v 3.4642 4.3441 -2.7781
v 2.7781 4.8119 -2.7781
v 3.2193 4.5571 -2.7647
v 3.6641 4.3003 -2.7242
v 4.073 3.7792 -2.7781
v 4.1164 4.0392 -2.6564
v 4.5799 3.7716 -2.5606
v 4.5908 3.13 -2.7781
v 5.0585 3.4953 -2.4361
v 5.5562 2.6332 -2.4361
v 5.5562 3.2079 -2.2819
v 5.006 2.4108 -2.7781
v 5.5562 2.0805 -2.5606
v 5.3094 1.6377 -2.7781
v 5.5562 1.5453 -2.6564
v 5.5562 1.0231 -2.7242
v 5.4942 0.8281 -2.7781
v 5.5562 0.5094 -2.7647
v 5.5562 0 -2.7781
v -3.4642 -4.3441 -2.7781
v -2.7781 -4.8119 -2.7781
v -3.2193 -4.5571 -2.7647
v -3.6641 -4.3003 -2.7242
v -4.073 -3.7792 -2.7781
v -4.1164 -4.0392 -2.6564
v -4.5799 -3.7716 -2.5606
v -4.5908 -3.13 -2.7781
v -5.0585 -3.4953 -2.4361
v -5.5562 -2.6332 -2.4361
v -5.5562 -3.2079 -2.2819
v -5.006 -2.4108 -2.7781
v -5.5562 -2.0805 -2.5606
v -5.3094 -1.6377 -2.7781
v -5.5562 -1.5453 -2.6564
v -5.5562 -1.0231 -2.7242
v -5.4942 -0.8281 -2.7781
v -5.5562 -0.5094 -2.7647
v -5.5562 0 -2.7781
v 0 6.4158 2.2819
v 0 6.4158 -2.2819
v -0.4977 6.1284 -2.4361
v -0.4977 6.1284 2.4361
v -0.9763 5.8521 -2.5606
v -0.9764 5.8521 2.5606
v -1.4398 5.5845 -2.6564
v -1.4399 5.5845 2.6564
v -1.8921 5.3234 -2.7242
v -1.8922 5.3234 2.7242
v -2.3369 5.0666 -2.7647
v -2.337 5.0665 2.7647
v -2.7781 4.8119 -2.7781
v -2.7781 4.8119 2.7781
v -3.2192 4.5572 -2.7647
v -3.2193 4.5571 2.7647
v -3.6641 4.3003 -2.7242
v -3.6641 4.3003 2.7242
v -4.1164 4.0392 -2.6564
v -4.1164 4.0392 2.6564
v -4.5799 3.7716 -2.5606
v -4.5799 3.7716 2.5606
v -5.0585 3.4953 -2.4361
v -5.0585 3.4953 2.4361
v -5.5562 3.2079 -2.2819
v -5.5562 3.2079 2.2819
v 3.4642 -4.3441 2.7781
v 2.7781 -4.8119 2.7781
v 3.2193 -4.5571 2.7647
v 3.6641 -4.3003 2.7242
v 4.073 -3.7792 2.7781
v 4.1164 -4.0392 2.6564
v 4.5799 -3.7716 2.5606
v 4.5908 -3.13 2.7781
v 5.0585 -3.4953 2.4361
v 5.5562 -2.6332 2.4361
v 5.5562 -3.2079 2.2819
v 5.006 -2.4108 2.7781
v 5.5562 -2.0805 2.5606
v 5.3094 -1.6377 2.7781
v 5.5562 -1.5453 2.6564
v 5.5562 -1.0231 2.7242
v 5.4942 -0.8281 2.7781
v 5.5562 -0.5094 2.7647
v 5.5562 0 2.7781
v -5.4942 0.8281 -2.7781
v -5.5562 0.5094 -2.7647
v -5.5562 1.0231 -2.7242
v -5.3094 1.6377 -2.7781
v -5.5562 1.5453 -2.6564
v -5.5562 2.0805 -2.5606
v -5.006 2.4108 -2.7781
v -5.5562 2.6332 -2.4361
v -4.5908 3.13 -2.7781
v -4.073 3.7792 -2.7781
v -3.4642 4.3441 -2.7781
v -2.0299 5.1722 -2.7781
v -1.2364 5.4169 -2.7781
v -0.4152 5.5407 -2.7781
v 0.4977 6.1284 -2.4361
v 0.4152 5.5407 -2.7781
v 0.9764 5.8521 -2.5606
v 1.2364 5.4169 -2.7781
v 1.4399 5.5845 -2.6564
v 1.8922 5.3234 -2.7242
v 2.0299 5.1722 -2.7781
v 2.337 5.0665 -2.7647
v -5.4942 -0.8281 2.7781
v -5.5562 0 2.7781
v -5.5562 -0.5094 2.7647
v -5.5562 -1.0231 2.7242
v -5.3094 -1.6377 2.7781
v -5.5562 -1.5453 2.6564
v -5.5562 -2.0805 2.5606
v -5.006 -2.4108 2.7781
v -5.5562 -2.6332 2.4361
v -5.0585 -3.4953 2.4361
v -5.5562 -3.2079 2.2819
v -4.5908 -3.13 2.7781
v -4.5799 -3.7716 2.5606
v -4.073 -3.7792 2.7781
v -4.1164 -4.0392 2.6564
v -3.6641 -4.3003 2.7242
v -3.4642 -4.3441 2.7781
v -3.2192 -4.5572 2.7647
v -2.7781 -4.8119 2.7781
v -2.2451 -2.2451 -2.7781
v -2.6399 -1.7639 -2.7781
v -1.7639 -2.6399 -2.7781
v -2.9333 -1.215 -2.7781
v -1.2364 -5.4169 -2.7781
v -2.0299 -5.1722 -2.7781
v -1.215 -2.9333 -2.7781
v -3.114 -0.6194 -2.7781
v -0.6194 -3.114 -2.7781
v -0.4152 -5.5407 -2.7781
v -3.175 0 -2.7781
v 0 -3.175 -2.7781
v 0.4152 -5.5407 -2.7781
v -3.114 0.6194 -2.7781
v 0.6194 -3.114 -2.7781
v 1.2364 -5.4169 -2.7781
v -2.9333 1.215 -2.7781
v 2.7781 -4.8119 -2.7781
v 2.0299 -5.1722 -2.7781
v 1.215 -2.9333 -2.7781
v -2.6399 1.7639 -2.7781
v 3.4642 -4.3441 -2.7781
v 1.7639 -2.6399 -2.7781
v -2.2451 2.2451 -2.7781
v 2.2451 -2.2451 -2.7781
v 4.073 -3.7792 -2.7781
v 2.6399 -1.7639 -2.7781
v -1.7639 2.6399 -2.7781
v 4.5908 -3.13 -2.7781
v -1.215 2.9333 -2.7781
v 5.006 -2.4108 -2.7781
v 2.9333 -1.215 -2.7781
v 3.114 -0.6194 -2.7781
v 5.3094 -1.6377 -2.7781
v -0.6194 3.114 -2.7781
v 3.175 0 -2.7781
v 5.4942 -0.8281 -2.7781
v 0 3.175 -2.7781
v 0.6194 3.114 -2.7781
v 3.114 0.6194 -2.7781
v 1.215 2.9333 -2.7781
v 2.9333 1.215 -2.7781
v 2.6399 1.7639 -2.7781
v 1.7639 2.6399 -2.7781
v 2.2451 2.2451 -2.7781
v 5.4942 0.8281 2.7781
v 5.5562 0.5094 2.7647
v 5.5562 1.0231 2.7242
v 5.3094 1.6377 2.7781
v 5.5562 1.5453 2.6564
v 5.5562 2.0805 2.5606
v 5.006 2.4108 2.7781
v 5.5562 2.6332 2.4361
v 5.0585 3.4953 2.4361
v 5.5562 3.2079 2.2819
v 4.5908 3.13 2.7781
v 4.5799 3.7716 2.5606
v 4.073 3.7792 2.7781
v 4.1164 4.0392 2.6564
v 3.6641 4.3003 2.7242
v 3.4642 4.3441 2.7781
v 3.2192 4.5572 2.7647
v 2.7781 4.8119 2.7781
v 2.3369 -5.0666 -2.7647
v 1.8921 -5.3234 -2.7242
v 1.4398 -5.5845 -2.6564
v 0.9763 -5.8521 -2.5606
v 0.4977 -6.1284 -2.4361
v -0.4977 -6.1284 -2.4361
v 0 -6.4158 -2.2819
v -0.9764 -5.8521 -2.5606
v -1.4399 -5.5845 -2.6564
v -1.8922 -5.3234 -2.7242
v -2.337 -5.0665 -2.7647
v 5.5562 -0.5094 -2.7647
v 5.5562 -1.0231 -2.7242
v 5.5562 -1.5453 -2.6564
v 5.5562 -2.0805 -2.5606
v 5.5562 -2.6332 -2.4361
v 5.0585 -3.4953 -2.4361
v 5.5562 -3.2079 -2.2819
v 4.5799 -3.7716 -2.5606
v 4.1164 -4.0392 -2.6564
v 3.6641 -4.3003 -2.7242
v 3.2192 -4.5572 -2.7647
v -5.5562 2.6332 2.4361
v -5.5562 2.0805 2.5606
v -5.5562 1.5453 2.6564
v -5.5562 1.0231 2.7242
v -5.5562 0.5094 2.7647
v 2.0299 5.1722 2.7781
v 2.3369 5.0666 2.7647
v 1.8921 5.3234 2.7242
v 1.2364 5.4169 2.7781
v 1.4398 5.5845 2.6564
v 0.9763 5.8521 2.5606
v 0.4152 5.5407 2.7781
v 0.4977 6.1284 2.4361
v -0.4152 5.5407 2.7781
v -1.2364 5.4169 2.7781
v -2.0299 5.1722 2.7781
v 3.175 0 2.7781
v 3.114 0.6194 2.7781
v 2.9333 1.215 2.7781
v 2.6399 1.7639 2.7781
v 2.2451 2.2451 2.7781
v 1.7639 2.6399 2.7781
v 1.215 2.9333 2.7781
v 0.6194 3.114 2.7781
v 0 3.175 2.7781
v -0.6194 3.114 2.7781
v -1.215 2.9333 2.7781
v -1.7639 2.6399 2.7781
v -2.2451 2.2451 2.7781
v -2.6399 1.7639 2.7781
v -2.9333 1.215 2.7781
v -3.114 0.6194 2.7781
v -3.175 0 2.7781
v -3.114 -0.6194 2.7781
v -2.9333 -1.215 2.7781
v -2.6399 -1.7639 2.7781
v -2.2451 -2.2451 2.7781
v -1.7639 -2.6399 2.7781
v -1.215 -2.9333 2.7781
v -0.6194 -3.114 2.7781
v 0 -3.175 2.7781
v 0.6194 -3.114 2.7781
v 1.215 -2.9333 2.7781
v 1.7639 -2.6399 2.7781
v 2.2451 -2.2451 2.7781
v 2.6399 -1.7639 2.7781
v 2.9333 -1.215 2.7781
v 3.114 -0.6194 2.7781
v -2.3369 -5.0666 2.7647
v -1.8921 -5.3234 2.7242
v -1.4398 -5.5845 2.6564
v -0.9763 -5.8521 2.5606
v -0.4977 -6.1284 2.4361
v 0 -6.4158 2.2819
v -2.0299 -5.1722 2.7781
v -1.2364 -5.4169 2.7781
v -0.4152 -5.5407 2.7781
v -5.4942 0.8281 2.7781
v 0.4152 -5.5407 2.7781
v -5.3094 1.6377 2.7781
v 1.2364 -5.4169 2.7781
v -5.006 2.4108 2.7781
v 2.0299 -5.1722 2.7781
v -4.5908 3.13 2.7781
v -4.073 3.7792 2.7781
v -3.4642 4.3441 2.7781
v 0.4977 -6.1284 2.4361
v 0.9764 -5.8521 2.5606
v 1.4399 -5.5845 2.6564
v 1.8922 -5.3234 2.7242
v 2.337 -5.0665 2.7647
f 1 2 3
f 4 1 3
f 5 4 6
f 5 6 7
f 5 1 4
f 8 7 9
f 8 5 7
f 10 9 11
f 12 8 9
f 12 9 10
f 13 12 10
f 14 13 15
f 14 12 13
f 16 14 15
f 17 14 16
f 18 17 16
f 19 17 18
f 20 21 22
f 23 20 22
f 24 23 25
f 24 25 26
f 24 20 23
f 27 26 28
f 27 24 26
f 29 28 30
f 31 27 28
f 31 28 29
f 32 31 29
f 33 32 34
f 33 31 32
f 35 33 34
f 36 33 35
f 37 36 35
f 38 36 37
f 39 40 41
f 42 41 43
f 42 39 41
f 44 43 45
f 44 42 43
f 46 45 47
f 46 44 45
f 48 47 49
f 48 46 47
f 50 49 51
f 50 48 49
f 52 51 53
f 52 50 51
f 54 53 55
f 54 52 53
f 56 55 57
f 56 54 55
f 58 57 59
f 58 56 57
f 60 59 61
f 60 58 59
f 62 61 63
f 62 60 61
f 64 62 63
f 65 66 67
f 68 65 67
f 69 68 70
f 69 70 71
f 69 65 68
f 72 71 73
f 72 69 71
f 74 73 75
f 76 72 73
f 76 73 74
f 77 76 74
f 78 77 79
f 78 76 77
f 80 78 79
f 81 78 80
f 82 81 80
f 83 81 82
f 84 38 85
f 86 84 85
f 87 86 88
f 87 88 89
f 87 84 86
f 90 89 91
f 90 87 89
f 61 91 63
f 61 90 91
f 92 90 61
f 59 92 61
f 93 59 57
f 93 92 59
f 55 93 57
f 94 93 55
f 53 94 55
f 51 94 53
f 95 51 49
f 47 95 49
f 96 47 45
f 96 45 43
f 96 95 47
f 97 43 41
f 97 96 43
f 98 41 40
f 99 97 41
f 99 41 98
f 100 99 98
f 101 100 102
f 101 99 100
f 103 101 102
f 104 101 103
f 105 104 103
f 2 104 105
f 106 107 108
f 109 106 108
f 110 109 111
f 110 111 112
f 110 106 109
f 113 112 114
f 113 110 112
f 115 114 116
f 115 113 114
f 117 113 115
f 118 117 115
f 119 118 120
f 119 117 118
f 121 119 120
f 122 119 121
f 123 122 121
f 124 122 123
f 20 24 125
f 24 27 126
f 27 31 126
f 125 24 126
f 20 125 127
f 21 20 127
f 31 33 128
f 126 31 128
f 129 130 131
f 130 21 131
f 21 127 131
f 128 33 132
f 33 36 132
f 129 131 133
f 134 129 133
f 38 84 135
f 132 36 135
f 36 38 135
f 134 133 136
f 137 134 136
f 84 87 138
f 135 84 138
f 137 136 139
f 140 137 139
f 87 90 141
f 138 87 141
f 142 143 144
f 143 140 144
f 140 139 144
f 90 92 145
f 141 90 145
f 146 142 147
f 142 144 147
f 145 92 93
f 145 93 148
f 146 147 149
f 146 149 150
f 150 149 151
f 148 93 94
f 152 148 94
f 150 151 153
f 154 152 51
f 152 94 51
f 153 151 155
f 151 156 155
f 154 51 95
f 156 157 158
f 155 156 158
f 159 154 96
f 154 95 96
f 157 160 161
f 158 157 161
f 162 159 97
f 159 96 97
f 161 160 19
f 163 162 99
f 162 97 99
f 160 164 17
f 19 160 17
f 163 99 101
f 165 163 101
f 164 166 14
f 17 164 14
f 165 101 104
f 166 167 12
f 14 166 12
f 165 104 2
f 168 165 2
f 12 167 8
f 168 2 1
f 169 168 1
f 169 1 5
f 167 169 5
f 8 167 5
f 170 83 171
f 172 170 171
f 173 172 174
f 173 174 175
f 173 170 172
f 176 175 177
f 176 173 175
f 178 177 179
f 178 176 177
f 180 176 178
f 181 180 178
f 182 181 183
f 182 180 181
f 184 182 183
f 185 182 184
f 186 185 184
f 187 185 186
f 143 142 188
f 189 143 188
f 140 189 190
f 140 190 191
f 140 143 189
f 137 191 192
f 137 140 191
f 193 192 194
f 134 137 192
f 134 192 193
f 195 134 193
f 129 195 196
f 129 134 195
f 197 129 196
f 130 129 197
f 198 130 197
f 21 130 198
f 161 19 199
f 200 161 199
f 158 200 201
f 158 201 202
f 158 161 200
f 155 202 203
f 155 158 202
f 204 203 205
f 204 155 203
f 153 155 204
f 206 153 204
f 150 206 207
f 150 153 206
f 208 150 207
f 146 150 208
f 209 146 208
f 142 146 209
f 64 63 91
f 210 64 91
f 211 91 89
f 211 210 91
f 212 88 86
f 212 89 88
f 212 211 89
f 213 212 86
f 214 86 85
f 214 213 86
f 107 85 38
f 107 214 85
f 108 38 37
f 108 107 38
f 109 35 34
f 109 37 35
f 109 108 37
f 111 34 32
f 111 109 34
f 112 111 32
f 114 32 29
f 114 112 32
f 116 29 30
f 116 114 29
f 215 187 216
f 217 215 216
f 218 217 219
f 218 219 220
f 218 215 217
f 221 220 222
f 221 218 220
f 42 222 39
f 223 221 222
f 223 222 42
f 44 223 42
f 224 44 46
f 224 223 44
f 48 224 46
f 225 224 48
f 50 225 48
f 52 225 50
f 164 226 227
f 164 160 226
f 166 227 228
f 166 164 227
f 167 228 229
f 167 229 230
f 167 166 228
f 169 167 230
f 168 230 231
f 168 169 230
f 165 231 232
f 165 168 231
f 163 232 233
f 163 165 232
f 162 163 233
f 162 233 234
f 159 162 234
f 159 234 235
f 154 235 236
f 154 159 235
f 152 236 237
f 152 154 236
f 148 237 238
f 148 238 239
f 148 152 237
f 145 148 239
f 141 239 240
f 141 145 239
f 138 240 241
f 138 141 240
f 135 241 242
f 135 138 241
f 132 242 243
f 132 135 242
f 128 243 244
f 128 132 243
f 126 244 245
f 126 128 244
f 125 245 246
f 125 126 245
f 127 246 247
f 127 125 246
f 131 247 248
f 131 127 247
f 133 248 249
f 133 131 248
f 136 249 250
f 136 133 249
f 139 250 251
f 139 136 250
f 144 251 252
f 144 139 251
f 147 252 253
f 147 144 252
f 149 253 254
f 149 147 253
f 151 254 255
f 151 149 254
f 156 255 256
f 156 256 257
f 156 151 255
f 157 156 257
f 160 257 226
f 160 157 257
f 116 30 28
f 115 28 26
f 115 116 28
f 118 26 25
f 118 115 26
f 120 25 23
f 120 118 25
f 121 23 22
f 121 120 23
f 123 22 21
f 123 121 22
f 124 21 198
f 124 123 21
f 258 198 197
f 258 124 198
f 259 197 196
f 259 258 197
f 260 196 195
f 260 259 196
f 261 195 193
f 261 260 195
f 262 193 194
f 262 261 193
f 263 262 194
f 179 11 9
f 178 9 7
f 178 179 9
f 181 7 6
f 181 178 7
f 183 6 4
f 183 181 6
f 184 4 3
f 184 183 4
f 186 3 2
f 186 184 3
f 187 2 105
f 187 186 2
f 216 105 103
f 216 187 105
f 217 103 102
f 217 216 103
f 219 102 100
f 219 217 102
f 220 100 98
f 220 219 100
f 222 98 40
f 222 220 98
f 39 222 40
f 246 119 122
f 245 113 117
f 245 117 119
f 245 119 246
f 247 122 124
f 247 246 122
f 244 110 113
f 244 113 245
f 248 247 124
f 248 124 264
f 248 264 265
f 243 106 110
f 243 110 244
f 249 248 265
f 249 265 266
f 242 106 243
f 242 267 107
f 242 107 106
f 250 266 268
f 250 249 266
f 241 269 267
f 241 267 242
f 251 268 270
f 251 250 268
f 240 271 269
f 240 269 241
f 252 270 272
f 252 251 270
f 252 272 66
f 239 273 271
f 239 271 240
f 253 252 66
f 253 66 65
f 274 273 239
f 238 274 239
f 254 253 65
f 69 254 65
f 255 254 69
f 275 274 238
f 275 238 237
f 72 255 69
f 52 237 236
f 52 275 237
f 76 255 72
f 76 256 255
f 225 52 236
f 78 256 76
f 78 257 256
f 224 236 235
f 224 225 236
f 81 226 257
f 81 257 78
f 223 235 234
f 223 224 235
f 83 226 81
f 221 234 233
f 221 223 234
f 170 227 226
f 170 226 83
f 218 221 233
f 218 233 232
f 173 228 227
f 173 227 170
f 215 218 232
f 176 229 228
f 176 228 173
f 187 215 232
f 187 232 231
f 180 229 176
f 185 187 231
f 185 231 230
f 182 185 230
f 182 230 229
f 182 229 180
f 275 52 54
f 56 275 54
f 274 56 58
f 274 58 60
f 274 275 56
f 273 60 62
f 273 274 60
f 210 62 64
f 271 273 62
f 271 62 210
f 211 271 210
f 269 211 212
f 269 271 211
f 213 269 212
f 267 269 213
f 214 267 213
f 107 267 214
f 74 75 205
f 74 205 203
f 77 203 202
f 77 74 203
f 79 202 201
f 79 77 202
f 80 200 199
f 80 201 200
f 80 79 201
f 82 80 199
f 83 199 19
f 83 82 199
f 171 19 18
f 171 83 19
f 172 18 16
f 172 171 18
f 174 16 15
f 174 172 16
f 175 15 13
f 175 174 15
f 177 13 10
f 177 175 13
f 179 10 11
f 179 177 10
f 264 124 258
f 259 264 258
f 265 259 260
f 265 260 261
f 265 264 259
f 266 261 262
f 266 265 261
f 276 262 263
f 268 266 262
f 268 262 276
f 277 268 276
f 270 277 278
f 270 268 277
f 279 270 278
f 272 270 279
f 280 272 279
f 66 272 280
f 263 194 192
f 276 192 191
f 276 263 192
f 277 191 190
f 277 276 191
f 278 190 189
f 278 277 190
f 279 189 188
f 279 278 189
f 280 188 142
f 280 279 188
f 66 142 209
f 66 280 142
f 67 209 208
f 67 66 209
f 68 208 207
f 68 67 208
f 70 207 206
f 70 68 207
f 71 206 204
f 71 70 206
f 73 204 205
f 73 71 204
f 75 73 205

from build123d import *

# Parameters (mm, degrees)
SKETCH1_R               = 3.175
EXTRUDE1_DEPTH          = 2.778125
SKETCH7_OUTSIDE_W       = 104.672
SKETCH7_OUTSIDE_H       = 106.392
SKETCH7_OUTSIDE_R       = 5.55625
EXTRUDE2_DEPTH          = 25.4
EXTRUDE2_DRAFT          = -60
MIRROR1_COPY_1_SKETCH_W = 104.672
MIRROR1_COPY_1_SKETCH_H = 106.392
MIRROR1_COPY_1_SKETCH_R = 5.55625
MIRROR1_COPY_1_DEPTH    = 25.4
MIRROR1_COPY_1_DRAFT    = -60


with BuildPart() as part:
    # Sketch1 → Extrude1 (new, symmetric)
    with BuildSketch(Plane.XY):
        Polygon((-5.55625, 3.207902433), (-5.55625, -3.207902433), (0, -6.415804866), (5.55625, -3.207902433), (5.55625, 3.207902433), (0, 6.415804866), align=None)
        Circle(SKETCH1_R, mode=Mode.SUBTRACT)
    extrude(amount=EXTRUDE1_DEPTH, both=True)


with BuildPart() as extrude2_tool:
    # Sketch7 outside → Extrude2 (with draft: the straight prism first)
    with BuildSketch(Plane.XY.offset(2.778125)):
        Rectangle(SKETCH7_OUTSIDE_W, SKETCH7_OUTSIDE_H)
        Circle(SKETCH7_OUTSIDE_R, mode=Mode.SUBTRACT)
    extrude(amount=-EXTRUDE2_DEPTH)
    # Extrude2: the draft: its side faces are tilted about the plane it starts from
    extrude2_sides = [extrude2_tool.faces().sort_by_distance(p)[0] for p in [
        (0, -53.196, -9.921875),
        (52.336, 0, -9.921875),
        (0, 53.196, -9.921875),
        (-52.336, 0, -9.921875),
        (-5.55625, 0, -9.921875),
    ]]
    draft(extrude2_sides, Plane.XY.offset(2.778125), EXTRUDE2_DRAFT)


with BuildPart() as part_1:
    add(part.part)

    # Extrude2: cut by extrude2_tool
    add(extrude2_tool.part, mode=Mode.SUBTRACT)


with BuildPart() as mirror1_copy_1_tool:
    # Mirror1 copy 1 sketch → Mirror1 copy 1 (with draft: the straight prism first)
    with BuildSketch(Plane(origin=(0, 0, -2.778125), x_dir=(1, 0, 0), z_dir=(0, 0, -1))):
        Rectangle(MIRROR1_COPY_1_SKETCH_W, MIRROR1_COPY_1_SKETCH_H)
        Circle(MIRROR1_COPY_1_SKETCH_R, mode=Mode.SUBTRACT)
    extrude(amount=-MIRROR1_COPY_1_DEPTH)
    # Mirror1 copy 1: the draft: its side faces are tilted about the plane it starts from
    mirror1_copy_1_sides = [mirror1_copy_1_tool.faces().sort_by_distance(p)[0] for p in [
        (0, -53.196, 9.921875),
        (52.336, 0, 9.921875),
        (0, 53.196, 9.921875),
        (-52.336, 0, 9.921875),
        (-5.55625, 0, 9.921875),
    ]]
    draft(mirror1_copy_1_sides, Plane(origin=(0, 0, -2.778125), x_dir=(1, 0, 0), z_dir=(0, 0, -1)), MIRROR1_COPY_1_DRAFT)


with BuildPart() as part_2:
    add(part_1.part)

    # Mirror1 copy 1: cut by mirror1_copy_1_tool
    add(mirror1_copy_1_tool.part, mode=Mode.SUBTRACT)


solid = part_2.part
